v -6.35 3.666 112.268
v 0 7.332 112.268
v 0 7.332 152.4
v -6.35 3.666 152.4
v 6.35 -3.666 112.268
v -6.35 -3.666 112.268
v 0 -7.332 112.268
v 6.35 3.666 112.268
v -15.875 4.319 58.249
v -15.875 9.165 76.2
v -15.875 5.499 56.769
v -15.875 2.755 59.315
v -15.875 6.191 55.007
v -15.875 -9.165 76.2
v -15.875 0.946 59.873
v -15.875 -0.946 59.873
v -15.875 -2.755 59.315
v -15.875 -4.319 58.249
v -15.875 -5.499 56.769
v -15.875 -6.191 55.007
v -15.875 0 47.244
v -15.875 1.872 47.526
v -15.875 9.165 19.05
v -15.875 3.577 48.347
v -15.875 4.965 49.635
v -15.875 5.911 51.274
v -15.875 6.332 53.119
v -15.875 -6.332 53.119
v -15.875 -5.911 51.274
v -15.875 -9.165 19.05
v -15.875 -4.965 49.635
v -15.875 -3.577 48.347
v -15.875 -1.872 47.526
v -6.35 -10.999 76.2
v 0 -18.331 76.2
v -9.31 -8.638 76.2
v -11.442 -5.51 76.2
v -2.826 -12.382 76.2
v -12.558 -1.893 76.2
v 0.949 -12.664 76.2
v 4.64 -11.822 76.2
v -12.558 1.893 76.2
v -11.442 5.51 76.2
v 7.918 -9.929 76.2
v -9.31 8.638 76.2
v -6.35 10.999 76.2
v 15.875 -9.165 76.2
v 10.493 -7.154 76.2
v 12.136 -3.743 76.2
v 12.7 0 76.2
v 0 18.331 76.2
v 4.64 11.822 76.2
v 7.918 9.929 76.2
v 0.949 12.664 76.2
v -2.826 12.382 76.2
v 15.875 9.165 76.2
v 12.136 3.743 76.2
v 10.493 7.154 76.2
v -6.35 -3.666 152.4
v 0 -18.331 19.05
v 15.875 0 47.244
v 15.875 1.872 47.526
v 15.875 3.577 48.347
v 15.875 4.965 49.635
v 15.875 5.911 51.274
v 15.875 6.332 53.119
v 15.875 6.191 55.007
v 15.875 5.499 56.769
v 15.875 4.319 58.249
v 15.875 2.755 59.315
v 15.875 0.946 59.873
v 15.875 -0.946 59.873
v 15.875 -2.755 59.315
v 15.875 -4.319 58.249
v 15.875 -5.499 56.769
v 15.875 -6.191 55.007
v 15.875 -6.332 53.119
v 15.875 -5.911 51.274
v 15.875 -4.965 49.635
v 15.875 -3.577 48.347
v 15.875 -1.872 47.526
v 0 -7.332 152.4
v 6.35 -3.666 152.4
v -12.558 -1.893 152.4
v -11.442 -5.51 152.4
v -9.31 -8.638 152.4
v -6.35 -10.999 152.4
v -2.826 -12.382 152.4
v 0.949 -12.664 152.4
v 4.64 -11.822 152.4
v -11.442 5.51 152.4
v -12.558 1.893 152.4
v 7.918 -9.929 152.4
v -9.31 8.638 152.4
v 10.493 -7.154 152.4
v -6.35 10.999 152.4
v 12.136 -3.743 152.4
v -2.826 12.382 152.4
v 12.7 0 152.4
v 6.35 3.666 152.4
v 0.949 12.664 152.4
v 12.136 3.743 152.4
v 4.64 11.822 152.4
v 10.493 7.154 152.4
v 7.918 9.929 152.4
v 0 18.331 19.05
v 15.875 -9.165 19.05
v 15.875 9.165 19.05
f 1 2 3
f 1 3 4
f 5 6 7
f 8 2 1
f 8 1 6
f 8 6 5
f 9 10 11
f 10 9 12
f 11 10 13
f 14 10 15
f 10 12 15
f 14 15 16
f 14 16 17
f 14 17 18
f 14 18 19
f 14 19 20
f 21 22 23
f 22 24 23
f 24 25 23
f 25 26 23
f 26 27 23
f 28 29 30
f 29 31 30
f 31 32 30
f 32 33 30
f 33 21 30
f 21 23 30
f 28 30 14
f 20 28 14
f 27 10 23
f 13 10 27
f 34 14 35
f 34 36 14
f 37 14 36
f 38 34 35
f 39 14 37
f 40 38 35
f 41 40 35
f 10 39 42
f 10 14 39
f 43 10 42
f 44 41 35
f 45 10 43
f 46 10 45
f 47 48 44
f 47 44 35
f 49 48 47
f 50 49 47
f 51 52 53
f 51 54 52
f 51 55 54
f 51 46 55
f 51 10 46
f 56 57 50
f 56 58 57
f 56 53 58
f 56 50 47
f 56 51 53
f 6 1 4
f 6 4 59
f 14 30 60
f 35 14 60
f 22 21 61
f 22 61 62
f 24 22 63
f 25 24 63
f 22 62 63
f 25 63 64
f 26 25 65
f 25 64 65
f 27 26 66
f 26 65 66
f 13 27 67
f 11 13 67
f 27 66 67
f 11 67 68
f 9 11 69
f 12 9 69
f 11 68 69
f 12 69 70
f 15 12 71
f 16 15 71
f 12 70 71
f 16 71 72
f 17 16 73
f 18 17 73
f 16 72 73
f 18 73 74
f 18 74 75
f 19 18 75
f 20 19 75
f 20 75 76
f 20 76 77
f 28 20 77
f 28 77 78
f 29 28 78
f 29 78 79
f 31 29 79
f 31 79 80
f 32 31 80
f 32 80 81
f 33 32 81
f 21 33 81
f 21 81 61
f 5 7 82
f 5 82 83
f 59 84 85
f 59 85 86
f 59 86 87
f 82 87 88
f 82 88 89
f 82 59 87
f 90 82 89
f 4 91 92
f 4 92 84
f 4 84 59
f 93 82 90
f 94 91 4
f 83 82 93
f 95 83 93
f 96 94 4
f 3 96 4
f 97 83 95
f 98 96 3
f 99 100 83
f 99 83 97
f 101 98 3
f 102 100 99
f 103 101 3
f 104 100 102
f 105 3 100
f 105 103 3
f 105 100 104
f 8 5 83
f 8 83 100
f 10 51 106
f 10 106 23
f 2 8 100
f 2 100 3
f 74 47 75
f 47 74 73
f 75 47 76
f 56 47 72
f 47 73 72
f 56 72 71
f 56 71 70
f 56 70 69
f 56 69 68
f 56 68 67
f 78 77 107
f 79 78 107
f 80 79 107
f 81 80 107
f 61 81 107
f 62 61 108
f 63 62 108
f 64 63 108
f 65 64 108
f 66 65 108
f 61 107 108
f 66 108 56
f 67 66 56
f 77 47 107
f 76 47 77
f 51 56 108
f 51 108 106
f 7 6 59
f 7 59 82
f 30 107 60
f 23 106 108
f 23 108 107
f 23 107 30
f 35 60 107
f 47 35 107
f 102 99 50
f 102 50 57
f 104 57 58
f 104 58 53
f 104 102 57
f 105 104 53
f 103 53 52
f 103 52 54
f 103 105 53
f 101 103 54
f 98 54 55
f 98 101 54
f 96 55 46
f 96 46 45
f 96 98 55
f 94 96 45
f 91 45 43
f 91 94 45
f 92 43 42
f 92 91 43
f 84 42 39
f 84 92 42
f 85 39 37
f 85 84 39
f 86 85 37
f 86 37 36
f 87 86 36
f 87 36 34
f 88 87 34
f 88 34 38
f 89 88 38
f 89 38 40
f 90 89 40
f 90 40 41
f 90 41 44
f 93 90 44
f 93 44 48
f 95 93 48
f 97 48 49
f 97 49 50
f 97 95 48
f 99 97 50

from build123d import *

# Parameters (mm, degrees)
BOSS_EXTRUDE1_DEPTH      = 152.4
BOSS_EXTRUDE1_DEPTH_BACK = 152.4
CUT_EXTRUDE1_DEPTH       = 171.45
CUT_EXTRUDE2_DEPTH       = 40.132
SKETCH6_R                = 18.330871047
SKETCH6_R_2              = 12.7
CUT_EXTRUDE3_DEPTH       = 76.2
SKETCH7_R                = 6.35
CUT_EXTRUDE4_DEPTH       = 157.747705991


with BuildPart() as part:
    # Sketch3 → Boss-Extrude1 (new, two sides: drawn at the far end of the back side and taken through both)
    with BuildSketch(Plane.XY.offset(-BOSS_EXTRUDE1_DEPTH_BACK)):
        Polygon((0, 18.330871047), (-15.875, 9.165435523), (-15.875, -9.165435523), (0, -18.330871047), (15.875, -9.165435523), (15.875, 9.165435523), align=None)
    extrude(amount=BOSS_EXTRUDE1_DEPTH + BOSS_EXTRUDE1_DEPTH_BACK)

    # Sketch4 → Cut-Extrude1 (cut)
    with BuildSketch(Plane(origin=(0, 0, -152.4), x_dir=(-1, 0, 0), z_dir=(0, 0, -1))):
        Polygon((0, 18.330871047), (-15.875, 9.165435523), (-15.875, -9.165435523), (0, -18.330871047), (15.875, -9.165435523), (15.875, 9.165435523), align=None)
    extrude(amount=-CUT_EXTRUDE1_DEPTH, mode=Mode.SUBTRACT)

    # Sketch5 → Cut-Extrude2 (cut)
    with BuildSketch(Plane.XY.offset(152.4)):
        Polygon((0, 7.332348419), (-6.35, 3.666174209), (-6.35, -3.666174209), (0, -7.332348419), (6.35, -3.666174209), (6.35, 3.666174209), align=None)
    extrude(amount=-CUT_EXTRUDE2_DEPTH, mode=Mode.SUBTRACT)

    # Sketch6 → Cut-Extrude3 (cut)
    with BuildSketch(Plane.XY.offset(152.4)):
        Circle(SKETCH6_R)
        Circle(SKETCH6_R_2, mode=Mode.SUBTRACT)
    extrude(amount=-CUT_EXTRUDE3_DEPTH, mode=Mode.SUBTRACT)

    # Sketch7 → Cut-Extrude4 (cut, through all)
    with BuildSketch(Plane(origin=(15.875, 0, 0), x_dir=(0, 0, -1), z_dir=(1, 0, 0))):
        with Locations((-53.594, 0)):
            Circle(SKETCH7_R)
    extrude(amount=-CUT_EXTRUDE4_DEPTH, mode=Mode.SUBTRACT)


solid = part.part
